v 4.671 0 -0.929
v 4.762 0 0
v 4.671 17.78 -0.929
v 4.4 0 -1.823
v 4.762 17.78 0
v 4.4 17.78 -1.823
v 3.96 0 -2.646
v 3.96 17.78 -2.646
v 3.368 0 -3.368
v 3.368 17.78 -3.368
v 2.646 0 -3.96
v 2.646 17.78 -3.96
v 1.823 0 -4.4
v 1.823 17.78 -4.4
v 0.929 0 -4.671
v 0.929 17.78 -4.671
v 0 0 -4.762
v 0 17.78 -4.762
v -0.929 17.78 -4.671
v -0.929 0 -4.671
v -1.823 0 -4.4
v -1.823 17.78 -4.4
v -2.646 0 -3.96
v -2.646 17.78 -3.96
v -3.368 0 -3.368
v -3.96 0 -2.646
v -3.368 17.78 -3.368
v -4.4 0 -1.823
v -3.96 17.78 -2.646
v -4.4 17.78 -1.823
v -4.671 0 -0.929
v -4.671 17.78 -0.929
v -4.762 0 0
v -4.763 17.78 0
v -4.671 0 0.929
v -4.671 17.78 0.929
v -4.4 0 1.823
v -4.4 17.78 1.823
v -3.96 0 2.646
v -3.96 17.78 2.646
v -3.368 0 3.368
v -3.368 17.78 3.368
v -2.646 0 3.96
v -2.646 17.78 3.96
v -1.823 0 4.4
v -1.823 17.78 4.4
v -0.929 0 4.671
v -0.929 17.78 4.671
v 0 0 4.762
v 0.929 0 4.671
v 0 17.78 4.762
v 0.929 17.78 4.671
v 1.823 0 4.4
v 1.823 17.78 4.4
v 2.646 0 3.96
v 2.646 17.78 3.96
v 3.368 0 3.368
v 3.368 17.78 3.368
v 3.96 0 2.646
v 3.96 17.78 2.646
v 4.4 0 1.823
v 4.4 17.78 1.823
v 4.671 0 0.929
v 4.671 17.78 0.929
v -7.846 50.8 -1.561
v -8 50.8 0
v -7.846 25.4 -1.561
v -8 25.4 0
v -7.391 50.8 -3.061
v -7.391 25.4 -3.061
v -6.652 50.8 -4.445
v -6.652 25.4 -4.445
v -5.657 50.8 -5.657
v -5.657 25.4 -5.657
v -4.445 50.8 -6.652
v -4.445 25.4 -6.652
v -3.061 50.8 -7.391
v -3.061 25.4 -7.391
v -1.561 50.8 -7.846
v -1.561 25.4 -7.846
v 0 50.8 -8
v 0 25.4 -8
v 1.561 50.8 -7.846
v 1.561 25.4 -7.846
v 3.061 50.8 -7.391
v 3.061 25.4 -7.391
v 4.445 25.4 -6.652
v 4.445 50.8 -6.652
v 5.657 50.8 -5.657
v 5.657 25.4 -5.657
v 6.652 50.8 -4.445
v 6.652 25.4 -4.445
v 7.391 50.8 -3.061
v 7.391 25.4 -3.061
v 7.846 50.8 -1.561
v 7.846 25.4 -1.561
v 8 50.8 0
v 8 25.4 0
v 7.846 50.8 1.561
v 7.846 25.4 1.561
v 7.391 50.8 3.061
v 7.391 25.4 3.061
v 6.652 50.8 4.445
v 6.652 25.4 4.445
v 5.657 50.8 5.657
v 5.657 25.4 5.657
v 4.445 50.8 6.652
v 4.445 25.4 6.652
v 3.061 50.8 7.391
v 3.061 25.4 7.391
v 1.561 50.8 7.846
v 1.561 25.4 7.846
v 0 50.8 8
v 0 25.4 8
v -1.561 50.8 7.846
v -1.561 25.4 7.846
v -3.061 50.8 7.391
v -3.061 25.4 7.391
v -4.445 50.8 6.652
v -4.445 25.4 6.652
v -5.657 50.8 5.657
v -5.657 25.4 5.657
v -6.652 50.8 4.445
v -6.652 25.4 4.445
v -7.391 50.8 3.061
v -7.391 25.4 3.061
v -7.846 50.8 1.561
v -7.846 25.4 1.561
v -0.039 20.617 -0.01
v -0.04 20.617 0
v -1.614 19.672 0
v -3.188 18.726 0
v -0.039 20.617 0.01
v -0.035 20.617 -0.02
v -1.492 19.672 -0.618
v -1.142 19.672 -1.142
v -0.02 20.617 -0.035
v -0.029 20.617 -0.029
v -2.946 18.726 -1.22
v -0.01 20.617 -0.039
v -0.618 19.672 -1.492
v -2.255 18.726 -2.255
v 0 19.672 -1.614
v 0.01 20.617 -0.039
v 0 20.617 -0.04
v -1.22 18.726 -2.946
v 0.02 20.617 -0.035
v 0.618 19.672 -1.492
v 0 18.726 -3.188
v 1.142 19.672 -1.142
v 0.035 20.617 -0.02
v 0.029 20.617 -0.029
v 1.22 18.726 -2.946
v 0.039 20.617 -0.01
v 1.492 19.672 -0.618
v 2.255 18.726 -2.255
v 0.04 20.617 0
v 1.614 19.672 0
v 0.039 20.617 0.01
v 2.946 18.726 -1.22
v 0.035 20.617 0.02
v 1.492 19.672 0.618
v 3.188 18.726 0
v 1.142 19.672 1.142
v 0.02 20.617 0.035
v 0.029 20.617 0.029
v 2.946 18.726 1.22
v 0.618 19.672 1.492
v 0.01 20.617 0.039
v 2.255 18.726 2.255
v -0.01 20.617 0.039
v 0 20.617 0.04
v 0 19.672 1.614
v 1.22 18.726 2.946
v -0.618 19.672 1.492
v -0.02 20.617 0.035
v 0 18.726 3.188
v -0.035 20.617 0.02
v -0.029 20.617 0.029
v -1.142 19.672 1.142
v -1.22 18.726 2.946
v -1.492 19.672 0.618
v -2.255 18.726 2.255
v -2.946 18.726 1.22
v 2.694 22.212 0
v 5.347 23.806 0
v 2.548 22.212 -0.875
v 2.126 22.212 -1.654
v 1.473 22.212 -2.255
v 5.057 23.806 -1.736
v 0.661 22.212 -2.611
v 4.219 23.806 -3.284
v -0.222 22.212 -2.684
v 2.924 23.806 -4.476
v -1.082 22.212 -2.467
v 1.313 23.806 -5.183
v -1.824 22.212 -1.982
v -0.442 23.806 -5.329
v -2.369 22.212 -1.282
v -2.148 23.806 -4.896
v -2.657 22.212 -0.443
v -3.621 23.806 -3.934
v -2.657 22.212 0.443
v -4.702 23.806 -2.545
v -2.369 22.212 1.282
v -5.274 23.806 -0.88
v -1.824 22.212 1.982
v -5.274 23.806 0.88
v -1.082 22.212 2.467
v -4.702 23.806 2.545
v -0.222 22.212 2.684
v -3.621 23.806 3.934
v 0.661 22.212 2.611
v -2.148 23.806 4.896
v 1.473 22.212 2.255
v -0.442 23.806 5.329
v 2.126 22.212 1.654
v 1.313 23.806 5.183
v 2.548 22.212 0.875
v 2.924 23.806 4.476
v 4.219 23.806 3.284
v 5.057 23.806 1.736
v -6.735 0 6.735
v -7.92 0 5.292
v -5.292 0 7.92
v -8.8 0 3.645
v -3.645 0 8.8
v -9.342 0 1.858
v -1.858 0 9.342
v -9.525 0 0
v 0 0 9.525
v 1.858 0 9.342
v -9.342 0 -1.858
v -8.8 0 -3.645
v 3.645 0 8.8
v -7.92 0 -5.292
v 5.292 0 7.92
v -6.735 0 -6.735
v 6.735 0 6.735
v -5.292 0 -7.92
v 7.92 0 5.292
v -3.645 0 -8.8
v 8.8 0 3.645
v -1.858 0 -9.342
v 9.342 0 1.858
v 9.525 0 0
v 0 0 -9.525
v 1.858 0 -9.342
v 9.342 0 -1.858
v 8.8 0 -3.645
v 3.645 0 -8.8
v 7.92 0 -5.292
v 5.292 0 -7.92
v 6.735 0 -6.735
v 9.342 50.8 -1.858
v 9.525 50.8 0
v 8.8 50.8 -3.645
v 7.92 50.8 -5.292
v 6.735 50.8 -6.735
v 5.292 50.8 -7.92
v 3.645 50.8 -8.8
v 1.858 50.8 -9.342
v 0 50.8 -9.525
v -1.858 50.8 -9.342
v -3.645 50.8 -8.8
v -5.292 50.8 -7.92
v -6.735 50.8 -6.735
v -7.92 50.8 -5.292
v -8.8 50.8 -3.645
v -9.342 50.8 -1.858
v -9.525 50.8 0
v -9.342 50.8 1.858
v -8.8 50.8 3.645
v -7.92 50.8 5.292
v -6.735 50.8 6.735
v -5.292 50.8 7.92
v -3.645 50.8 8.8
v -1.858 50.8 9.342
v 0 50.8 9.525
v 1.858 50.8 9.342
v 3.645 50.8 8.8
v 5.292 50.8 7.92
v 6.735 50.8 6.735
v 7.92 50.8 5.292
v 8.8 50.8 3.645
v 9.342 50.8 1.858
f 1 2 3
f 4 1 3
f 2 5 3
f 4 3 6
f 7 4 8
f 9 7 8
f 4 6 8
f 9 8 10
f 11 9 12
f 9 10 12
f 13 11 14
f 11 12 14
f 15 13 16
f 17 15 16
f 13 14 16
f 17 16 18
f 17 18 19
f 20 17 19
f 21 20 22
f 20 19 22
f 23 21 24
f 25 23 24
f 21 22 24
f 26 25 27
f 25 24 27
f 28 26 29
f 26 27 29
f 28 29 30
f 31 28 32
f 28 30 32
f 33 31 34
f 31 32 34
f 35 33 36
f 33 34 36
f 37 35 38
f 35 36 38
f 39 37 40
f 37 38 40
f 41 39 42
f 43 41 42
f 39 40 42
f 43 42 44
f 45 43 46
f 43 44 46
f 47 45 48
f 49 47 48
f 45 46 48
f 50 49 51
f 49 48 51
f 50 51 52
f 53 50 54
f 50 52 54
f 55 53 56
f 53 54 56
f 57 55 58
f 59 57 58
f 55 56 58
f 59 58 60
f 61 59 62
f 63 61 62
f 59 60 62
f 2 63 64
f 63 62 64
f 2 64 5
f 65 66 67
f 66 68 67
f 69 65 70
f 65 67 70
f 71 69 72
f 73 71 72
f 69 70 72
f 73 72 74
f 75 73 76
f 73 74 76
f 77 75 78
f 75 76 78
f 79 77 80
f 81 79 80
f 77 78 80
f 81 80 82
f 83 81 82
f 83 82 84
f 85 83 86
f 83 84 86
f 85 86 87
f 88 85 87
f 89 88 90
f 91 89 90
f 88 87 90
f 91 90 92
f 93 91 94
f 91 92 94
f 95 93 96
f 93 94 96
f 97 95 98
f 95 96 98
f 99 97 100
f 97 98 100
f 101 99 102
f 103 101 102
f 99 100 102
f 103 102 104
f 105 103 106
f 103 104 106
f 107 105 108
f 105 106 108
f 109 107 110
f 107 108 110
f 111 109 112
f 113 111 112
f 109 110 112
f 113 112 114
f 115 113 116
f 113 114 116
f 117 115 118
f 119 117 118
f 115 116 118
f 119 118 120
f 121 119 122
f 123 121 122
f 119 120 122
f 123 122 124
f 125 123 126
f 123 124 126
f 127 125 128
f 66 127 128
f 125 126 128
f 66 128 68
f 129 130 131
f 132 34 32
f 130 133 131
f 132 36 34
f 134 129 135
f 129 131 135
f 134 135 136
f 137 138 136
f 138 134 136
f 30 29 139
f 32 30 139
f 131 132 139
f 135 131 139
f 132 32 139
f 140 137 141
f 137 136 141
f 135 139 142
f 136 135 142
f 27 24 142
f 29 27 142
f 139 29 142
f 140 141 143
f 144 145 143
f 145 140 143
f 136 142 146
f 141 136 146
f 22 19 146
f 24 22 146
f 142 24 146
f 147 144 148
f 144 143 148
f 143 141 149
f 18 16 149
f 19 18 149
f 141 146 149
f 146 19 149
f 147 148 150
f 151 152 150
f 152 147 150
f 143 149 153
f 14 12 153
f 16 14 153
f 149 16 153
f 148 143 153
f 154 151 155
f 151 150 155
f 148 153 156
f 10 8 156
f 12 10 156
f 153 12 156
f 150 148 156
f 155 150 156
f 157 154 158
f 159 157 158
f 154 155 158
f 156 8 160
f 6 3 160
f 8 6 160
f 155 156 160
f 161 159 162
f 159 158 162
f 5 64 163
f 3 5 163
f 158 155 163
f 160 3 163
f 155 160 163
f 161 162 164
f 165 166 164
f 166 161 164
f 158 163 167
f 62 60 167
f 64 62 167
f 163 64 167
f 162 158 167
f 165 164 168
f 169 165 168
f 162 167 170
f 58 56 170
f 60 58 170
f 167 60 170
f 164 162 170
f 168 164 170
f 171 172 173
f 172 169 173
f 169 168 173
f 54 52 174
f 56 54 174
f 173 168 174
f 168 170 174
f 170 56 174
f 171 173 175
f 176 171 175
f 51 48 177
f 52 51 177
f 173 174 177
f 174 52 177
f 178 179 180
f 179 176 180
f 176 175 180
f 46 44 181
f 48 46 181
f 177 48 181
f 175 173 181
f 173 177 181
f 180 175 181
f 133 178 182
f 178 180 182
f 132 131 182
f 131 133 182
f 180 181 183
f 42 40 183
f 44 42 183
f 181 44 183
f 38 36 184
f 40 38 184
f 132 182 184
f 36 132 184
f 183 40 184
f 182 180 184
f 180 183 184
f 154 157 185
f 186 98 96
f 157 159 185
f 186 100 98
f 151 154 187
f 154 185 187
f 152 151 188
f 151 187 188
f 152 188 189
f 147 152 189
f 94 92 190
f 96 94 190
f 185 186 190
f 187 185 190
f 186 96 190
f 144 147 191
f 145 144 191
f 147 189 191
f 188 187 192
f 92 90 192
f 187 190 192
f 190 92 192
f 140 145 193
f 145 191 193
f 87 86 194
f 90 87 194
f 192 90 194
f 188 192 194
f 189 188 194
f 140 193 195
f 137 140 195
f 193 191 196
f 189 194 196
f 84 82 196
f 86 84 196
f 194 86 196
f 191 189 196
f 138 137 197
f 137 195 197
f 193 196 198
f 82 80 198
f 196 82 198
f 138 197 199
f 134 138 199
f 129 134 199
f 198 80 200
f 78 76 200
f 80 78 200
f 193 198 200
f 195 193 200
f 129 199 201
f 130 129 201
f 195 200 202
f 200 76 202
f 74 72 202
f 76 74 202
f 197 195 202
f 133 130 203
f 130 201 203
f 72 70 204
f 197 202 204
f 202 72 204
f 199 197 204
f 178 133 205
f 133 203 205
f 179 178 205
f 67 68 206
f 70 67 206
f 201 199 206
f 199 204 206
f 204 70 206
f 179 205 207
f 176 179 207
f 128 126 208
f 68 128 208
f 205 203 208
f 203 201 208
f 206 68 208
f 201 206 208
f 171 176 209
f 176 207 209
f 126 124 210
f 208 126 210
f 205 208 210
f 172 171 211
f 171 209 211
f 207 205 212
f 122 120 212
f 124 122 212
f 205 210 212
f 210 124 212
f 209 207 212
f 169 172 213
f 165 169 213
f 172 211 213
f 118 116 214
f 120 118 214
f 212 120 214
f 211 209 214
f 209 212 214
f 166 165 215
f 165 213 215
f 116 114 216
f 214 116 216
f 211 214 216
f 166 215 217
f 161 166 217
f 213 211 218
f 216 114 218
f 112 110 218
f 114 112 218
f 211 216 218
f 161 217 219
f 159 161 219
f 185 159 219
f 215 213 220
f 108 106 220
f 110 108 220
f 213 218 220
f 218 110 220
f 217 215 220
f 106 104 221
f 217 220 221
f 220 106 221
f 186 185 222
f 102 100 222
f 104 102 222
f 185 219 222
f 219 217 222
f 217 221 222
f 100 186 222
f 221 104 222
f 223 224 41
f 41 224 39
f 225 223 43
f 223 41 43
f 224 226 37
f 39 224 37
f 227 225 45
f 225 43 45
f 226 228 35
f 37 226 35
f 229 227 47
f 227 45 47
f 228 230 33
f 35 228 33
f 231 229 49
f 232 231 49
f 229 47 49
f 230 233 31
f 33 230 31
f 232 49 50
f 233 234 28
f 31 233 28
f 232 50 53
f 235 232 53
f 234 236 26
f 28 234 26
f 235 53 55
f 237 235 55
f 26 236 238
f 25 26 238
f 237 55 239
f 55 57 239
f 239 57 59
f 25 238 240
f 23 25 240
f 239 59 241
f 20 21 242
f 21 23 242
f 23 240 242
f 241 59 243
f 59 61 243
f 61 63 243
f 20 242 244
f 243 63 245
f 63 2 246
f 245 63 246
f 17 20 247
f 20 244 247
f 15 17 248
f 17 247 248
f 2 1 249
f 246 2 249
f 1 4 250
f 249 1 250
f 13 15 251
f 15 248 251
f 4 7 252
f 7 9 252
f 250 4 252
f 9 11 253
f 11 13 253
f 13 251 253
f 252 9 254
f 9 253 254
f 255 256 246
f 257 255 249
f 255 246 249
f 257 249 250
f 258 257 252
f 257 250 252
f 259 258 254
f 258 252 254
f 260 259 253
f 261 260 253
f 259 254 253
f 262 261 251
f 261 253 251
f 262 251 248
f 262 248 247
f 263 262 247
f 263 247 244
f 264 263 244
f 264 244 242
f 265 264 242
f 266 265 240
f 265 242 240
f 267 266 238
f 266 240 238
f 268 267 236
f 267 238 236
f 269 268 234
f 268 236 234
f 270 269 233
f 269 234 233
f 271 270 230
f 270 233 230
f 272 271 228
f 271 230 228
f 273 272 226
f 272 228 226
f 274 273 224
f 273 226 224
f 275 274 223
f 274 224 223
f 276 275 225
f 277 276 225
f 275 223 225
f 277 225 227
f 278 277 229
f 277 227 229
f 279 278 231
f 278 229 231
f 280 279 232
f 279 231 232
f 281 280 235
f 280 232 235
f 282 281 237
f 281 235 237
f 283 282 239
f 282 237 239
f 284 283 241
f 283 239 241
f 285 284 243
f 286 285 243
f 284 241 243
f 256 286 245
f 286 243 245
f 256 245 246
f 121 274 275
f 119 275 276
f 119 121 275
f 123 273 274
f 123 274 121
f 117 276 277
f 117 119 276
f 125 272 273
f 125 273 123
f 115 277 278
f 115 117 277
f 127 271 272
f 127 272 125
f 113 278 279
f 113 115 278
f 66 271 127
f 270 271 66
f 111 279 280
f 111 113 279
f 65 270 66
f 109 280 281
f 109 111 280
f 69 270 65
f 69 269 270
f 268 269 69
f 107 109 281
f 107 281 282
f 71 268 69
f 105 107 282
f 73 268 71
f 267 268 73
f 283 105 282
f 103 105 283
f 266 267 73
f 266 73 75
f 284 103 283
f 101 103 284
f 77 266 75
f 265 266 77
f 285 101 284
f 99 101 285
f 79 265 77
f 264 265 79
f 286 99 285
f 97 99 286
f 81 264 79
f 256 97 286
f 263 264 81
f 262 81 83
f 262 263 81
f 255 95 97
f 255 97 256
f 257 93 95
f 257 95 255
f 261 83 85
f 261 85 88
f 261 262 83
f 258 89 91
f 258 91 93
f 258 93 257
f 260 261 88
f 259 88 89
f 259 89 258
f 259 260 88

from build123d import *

# Parameters (mm, degrees)
SKETCH1_R                        = 9.525
BOSS_EXTRUDE1_DEPTH              = 50.8
F_16_0_16_DIAMETER_HOLE1_D       = 16
F_16_0_16_DIAMETER_HOLE1_DEPTH   = 25.4
F_16_0_16_DIAMETER_HOLE1_TIP     = 4.806884952
F_3_8_0_375_DIAMETER_HOLE1_D     = 9.525
F_3_8_0_375_DIAMETER_HOLE1_DEPTH = 17.78
F_3_8_0_375_DIAMETER_HOLE1_TIP   = 2.861598698


with BuildPart() as part:
    # Sketch1 → Boss-Extrude1 (new body)
    with BuildSketch(Plane(origin=(0, 0, 0), x_dir=(1, 0, 0), z_dir=(0, 1, 0))):
        Circle(SKETCH1_R)
    extrude(amount=BOSS_EXTRUDE1_DEPTH)

    # Ø16.0 (16) Diameter Hole1
    with Locations(Plane(origin=(0, 50.8, 0), x_dir=(1, 0, 0), z_dir=(0, 1, 0))):
        with Locations((0, 0)):
            Hole(F_16_0_16_DIAMETER_HOLE1_D / 2, depth=F_16_0_16_DIAMETER_HOLE1_DEPTH)
            with Locations((0, 0, -(F_16_0_16_DIAMETER_HOLE1_DEPTH + F_16_0_16_DIAMETER_HOLE1_TIP / 2))):  # 118° drill point
                Cone(0, F_16_0_16_DIAMETER_HOLE1_D / 2, F_16_0_16_DIAMETER_HOLE1_TIP, mode=Mode.SUBTRACT)

    # 3/8 (0.375) Diameter Hole1
    with Locations(Plane(origin=(0, 0, 0), x_dir=(-1, 0, 0), z_dir=(0, -1, 0))):
        with Locations((0, 0)):
            Hole(F_3_8_0_375_DIAMETER_HOLE1_D / 2, depth=F_3_8_0_375_DIAMETER_HOLE1_DEPTH)
            with Locations((0, 0, -(F_3_8_0_375_DIAMETER_HOLE1_DEPTH + F_3_8_0_375_DIAMETER_HOLE1_TIP / 2))):  # 118° drill point
                Cone(0, F_3_8_0_375_DIAMETER_HOLE1_D / 2, F_3_8_0_375_DIAMETER_HOLE1_TIP, mode=Mode.SUBTRACT)


solid = part.part
